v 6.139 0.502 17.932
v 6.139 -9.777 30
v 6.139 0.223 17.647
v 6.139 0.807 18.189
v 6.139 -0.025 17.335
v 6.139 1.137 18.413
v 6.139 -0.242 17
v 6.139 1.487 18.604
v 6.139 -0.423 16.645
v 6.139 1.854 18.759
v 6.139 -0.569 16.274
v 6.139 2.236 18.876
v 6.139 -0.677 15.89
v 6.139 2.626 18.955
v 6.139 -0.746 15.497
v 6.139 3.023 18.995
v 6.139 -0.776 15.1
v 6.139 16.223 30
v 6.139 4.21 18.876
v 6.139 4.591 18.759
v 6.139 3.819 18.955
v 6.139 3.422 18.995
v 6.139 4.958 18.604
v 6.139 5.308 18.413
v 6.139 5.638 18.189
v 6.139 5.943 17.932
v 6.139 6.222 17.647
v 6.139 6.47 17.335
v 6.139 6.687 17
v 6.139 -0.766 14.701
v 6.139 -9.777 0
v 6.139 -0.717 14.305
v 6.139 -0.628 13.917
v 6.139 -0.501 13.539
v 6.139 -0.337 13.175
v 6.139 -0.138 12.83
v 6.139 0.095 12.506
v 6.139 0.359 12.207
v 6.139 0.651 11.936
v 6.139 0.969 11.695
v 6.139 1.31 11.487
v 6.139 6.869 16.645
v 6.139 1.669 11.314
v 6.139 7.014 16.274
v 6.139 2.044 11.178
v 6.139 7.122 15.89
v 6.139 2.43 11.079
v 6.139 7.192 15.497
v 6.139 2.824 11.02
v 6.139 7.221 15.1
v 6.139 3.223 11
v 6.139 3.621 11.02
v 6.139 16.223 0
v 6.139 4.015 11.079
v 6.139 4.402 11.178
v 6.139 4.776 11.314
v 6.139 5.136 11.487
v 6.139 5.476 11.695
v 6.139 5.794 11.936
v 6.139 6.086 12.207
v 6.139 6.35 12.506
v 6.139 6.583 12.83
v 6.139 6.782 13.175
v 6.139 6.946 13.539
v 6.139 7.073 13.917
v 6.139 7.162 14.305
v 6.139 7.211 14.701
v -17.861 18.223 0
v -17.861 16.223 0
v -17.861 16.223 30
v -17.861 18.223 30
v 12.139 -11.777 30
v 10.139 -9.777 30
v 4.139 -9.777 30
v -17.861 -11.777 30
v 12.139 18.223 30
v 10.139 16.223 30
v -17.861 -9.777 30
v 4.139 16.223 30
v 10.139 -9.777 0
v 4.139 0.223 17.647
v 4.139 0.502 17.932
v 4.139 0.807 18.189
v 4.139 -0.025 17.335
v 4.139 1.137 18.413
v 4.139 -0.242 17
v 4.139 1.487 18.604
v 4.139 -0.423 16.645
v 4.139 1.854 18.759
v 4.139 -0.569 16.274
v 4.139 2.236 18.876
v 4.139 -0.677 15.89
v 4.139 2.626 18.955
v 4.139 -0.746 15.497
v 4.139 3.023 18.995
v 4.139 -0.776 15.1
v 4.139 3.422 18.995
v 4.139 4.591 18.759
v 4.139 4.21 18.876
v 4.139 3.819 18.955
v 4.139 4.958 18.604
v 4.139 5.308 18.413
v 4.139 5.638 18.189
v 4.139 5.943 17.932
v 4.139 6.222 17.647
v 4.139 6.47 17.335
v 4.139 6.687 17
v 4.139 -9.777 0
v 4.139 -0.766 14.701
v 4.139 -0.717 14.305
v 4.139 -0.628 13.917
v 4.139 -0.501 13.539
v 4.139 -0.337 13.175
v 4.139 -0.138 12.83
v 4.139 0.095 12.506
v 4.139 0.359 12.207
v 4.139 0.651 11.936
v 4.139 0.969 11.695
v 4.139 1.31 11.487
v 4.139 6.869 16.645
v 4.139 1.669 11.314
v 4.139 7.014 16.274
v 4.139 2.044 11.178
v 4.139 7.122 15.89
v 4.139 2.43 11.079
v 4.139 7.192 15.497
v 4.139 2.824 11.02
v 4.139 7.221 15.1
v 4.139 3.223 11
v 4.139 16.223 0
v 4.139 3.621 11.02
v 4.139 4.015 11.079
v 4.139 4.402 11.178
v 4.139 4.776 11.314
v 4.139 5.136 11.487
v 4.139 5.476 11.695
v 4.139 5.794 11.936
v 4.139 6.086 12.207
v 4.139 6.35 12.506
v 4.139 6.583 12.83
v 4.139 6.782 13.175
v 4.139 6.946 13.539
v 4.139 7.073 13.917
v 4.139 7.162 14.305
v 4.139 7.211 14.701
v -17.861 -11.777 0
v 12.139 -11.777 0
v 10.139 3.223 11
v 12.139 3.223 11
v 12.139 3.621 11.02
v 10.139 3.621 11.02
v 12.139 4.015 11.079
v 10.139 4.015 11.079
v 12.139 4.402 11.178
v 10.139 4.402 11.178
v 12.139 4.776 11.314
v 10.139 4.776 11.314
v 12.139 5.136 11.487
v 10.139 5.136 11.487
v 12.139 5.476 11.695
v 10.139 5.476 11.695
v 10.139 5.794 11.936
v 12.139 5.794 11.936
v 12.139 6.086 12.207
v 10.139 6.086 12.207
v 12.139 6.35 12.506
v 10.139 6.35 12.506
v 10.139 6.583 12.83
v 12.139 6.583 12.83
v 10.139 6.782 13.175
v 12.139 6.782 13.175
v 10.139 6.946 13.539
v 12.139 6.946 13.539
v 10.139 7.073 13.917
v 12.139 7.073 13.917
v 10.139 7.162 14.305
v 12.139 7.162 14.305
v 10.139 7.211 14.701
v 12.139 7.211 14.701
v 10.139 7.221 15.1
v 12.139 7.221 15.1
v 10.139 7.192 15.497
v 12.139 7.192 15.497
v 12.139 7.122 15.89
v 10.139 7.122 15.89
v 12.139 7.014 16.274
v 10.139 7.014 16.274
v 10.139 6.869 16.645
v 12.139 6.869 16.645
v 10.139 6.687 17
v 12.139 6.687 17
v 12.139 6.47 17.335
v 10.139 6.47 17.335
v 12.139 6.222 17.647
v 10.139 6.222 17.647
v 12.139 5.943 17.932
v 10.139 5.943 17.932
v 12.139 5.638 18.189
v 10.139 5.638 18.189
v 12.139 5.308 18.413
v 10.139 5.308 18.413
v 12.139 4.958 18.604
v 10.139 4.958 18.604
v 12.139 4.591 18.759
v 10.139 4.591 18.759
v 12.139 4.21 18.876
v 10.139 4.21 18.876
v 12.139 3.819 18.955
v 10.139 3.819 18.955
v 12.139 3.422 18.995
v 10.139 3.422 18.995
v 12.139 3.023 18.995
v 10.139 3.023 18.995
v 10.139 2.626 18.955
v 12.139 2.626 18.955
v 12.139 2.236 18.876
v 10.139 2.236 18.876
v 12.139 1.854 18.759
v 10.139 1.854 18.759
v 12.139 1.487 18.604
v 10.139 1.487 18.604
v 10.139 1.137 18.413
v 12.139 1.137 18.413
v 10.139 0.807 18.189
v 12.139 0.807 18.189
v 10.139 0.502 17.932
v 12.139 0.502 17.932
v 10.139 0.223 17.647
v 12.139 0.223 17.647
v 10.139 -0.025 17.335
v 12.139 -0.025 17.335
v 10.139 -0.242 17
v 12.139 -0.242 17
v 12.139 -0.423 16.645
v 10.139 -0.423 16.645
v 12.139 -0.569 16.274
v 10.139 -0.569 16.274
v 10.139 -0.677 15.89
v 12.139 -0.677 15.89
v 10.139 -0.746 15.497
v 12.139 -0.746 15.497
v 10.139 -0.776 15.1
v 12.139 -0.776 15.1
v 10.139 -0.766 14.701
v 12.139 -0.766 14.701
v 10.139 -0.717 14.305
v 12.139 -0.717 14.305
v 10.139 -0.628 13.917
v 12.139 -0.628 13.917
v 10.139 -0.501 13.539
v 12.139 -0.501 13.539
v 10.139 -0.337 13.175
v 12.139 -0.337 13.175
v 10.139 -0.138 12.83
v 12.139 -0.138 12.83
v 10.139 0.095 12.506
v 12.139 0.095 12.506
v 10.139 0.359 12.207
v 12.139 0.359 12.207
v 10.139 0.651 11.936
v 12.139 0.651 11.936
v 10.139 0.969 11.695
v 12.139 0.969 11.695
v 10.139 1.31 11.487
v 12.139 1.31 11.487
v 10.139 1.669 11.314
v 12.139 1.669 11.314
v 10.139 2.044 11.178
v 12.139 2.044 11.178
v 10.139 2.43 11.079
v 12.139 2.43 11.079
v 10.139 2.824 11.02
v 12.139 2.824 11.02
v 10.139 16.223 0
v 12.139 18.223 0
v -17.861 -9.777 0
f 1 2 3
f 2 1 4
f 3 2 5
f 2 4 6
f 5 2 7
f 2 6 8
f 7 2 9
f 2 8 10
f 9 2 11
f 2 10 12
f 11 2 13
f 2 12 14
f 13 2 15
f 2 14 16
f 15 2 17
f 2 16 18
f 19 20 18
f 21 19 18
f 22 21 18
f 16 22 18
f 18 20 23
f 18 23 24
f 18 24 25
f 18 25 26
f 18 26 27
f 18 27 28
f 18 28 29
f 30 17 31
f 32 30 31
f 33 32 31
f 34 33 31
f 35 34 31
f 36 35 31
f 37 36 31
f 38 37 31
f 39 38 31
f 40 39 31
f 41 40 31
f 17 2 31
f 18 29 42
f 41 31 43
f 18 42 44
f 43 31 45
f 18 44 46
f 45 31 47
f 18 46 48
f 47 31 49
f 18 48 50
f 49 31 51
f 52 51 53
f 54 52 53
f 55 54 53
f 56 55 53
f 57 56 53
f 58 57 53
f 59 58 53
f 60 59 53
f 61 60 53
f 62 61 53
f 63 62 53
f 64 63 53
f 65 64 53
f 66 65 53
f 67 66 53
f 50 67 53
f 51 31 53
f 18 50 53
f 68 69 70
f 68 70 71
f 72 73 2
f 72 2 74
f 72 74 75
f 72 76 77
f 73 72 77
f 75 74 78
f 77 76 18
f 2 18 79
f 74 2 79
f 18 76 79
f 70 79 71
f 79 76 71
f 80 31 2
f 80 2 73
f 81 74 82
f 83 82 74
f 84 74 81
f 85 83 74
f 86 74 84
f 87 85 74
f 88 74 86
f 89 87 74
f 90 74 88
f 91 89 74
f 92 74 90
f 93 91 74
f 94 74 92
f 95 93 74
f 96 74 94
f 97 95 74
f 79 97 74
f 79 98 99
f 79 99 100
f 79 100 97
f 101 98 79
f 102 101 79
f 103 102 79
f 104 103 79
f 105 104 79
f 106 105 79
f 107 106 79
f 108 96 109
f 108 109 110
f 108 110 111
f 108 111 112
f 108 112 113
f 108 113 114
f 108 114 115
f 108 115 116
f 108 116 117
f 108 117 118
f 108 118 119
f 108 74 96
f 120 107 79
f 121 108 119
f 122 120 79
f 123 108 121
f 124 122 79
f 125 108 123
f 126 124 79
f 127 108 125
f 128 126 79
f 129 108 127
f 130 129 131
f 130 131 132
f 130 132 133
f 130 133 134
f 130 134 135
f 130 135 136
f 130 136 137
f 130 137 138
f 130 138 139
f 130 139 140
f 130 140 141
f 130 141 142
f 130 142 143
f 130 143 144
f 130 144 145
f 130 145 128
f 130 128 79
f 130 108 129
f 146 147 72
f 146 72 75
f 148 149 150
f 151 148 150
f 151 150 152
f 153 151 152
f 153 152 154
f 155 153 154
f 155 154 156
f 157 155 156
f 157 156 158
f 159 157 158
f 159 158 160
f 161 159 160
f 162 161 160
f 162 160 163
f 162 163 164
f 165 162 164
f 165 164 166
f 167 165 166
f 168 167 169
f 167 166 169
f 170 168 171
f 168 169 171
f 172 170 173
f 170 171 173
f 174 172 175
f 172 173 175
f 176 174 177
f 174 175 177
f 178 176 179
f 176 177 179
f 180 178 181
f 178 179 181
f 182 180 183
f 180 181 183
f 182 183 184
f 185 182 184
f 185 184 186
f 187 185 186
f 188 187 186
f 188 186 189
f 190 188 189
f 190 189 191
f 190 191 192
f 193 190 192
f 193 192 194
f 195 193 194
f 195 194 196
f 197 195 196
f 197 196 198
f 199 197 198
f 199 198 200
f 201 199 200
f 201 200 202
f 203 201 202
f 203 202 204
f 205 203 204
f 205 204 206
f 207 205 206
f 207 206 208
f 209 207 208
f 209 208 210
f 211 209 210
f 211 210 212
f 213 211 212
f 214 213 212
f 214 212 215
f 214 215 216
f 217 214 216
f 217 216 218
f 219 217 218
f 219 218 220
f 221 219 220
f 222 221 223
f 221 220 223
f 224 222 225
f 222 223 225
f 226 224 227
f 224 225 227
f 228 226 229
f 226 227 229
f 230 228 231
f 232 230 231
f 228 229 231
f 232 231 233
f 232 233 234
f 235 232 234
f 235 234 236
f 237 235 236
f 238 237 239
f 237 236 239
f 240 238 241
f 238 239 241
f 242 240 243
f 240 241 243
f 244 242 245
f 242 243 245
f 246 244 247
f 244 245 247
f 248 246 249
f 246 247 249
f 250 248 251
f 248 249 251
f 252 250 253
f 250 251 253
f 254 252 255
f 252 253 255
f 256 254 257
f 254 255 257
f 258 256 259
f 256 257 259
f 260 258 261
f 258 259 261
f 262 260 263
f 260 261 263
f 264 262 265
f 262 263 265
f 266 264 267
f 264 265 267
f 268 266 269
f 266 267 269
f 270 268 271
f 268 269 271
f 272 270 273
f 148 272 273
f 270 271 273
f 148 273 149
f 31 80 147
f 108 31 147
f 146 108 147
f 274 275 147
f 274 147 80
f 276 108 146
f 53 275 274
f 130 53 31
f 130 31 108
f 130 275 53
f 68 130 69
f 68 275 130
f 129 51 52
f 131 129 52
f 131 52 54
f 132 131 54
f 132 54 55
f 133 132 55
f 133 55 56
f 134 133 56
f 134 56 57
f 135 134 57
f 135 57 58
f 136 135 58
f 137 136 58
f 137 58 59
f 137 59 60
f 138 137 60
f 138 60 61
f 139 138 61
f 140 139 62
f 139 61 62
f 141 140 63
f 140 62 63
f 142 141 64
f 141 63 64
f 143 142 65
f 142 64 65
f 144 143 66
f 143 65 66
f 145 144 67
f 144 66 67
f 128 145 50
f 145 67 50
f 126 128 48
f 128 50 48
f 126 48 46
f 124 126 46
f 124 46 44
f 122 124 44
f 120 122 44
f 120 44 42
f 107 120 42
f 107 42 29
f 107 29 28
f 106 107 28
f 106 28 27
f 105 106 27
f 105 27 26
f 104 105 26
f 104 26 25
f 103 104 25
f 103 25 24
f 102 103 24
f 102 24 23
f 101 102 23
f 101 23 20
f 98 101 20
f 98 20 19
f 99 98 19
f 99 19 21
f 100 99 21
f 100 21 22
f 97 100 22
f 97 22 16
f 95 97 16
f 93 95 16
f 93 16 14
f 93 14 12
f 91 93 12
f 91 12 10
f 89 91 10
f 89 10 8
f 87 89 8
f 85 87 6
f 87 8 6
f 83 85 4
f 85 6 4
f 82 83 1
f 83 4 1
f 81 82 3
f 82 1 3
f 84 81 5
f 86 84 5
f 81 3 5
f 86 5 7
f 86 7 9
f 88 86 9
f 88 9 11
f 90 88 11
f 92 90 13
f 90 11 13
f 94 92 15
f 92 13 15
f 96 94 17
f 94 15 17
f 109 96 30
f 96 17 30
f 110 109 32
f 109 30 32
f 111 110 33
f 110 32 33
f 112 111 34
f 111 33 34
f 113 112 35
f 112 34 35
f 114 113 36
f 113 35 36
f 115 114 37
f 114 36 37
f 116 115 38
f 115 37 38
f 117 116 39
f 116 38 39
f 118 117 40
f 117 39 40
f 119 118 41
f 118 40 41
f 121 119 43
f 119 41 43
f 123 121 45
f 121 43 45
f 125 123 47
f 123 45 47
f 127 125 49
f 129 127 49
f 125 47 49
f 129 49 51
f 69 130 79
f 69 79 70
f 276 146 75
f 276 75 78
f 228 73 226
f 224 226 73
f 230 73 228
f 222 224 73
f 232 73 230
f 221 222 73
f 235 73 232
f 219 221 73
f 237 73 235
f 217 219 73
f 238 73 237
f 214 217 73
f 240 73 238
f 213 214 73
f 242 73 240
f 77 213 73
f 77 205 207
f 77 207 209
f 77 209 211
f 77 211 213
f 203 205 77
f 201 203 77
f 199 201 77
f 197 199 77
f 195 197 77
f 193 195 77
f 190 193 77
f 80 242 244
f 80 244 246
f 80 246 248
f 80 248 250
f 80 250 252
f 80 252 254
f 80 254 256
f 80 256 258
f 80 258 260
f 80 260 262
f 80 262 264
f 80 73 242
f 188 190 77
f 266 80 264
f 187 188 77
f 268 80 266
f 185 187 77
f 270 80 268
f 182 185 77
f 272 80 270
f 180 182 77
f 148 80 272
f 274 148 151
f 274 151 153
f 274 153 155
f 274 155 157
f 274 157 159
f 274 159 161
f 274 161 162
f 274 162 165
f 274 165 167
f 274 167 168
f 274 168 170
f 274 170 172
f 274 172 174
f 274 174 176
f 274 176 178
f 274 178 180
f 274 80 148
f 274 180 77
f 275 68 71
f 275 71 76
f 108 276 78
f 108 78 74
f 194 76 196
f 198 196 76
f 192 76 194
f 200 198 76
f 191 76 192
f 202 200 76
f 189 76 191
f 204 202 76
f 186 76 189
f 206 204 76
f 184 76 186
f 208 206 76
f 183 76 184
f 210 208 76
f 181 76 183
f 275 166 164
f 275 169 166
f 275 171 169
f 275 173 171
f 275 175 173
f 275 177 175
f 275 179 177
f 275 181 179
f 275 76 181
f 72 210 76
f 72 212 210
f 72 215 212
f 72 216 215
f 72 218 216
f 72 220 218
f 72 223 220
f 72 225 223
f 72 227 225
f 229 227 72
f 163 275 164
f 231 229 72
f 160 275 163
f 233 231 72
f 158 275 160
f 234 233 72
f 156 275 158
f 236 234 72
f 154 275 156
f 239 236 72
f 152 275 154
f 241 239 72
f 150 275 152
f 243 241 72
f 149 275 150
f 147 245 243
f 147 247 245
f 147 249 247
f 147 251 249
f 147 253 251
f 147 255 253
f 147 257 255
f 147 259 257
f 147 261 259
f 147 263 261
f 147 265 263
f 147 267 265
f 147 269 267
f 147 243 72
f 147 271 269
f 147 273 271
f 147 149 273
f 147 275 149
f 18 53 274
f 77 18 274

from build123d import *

# Parameters (mm, degrees)
SKETCH1_W           = 4
SKETCH1_H           = 26
BOSS_EXTRUDE1_DEPTH = 30
SKETCH2_R           = 4
CUT_EXTRUDE1_DEPTH  = 30


with BuildPart() as part:
    # Sketch1 → Boss-Extrude1 (new body)
    with BuildSketch(Plane.XY):
        Polygon((-17.861271676, 18.222543353), (12.138728324, 18.222543353), (12.138728324, -11.777456647), (-17.861271676, -11.777456647), (-17.861271676, -9.777456647), (4.138728324, -9.777456647), (4.138728324, 16.222543353), (-17.861271676, 16.222543353), align=None)
        with Locations((8.138728324, 3.222543353)):
            Rectangle(SKETCH1_W, SKETCH1_H, mode=Mode.SUBTRACT)
    extrude(amount=BOSS_EXTRUDE1_DEPTH)

    # Sketch2 → Cut-Extrude1 (cut)
    with BuildSketch(Plane(origin=(12.138728324, 0, 0), x_dir=(0, 0, -1), z_dir=(1, 0, 0))):
        with Locations((-15, 3.222543353)):
            Circle(SKETCH2_R)
    extrude(amount=-CUT_EXTRUDE1_DEPTH, mode=Mode.SUBTRACT)


solid = part.part
